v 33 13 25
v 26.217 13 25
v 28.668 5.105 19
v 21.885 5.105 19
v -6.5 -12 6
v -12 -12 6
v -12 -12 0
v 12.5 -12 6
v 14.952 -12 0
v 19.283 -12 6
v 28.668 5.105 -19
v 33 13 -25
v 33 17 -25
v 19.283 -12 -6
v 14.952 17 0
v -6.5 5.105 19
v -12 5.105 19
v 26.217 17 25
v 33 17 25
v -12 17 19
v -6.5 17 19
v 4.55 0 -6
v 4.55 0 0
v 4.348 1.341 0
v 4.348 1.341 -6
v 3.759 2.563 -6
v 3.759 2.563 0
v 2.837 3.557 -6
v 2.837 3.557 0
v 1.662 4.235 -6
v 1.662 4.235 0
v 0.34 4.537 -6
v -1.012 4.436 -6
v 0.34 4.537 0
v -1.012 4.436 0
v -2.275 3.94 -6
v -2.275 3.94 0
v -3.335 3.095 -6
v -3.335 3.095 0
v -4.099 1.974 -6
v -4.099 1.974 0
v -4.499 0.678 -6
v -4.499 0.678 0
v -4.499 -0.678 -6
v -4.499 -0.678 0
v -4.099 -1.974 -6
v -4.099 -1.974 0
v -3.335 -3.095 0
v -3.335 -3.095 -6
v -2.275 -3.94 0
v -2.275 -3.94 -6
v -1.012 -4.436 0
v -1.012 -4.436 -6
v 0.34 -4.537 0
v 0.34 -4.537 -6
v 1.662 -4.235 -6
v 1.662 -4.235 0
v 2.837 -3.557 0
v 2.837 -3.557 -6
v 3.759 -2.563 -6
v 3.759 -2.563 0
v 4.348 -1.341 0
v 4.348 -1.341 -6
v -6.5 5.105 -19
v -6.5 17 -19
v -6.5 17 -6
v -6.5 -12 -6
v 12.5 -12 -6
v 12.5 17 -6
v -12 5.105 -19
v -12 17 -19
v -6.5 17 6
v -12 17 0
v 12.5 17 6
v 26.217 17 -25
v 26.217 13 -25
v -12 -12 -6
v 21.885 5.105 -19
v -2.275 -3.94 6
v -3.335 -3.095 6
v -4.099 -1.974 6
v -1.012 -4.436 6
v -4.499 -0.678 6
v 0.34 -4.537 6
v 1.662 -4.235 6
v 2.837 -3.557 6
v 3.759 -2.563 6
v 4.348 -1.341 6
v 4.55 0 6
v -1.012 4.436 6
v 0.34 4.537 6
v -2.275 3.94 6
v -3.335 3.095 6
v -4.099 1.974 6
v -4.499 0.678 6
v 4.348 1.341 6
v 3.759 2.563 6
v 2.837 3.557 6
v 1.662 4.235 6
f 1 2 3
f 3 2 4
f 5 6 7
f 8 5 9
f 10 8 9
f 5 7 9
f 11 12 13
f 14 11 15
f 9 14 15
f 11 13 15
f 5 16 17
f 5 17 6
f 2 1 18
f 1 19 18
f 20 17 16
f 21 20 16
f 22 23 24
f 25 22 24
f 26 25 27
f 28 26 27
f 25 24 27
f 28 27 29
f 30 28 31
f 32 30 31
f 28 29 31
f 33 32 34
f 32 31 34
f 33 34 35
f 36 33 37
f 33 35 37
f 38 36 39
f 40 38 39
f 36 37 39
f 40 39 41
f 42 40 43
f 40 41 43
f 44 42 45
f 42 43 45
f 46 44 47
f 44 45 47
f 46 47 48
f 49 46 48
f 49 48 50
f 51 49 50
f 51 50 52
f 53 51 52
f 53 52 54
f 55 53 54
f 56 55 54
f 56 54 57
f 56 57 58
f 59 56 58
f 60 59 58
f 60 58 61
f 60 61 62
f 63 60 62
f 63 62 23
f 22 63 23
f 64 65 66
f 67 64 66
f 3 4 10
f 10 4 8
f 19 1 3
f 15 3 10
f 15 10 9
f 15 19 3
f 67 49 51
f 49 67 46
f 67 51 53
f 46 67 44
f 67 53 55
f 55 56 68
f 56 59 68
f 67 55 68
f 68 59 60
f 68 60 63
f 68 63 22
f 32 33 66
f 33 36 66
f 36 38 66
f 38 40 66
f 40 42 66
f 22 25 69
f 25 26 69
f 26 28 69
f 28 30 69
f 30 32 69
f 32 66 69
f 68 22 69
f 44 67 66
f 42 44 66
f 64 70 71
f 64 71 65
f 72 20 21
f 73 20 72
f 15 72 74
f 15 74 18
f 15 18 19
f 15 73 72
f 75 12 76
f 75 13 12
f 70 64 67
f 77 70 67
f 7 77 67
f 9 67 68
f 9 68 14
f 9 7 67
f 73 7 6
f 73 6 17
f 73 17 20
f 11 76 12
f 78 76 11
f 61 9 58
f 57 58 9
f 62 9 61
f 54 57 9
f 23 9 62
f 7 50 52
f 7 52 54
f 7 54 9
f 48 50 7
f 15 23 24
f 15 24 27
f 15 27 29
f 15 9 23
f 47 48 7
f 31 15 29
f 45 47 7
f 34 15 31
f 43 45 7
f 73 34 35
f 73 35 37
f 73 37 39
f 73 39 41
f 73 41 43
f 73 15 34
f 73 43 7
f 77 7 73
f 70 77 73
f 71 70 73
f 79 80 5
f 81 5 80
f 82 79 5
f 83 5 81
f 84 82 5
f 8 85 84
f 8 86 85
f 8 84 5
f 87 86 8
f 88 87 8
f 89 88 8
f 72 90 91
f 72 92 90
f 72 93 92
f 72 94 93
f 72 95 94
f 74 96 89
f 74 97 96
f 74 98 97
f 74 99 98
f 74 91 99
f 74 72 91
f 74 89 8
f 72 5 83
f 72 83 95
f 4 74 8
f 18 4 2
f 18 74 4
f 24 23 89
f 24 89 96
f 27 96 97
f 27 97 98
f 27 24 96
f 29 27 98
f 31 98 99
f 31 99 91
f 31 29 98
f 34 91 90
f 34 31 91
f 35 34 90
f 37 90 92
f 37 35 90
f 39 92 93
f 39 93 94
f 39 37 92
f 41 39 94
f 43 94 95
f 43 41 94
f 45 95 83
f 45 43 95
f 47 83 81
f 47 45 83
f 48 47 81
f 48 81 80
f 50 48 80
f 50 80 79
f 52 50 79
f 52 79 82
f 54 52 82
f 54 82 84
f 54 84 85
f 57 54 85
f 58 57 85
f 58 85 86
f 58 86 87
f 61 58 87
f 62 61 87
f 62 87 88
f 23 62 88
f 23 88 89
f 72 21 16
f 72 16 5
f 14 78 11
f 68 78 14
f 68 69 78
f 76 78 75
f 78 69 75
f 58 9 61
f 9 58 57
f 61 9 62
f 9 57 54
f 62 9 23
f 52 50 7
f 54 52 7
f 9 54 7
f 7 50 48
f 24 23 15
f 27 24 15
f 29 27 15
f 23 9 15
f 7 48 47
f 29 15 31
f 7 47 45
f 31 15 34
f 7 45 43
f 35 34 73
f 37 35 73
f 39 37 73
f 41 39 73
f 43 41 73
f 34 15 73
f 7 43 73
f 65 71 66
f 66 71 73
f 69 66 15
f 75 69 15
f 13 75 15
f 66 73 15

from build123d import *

# Parameters (mm, degrees)
SKETCH1_R                      = 4.55
BOSS_EXTRUDE1_DEPTH            = 25
SKETCH2_W                      = 5.5
SKETCH2_H                      = 6
CUT_EXTRUDE1_DEPTH             = 30
CUT_EXTRUDE3_REACH             = 7.5
CUT_EXTRUDE3_DIRECTION_2_REACH = 41.5


with BuildPart() as part:
    # Sketch1 → Boss-Extrude1 (new body)
    with BuildSketch(Plane.XY):
        Polygon((-12, -12), (-12, 17), (33, 17), (33, 12), (33, -12), (0, -12), align=None)
        Circle(SKETCH1_R, mode=Mode.SUBTRACT)
    extrude(amount=-BOSS_EXTRUDE1_DEPTH)

    # Sketch2 → Cut-Extrude1 (cut, through all)
    with BuildSketch(Plane(origin=(0, 17, 0), x_dir=(1, 0, 0), z_dir=(0, 1, 0))):
        Polygon((33, 0), (33, 25), (14.951933913, 0), align=None)
        Polygon((26.216530226, 25), (-6.5, 25), (-6.5, 19), (-6.5, 6), (12.5, 6), align=None)
        with Locations((-9.25, 22)):
            Rectangle(SKETCH2_W, SKETCH2_H)
    extrude(amount=-CUT_EXTRUDE1_DEPTH, mode=Mode.SUBTRACT)

    # Cut-Extrude3: up to this face of the body (flat: up to its plane)
    cut_extrude3_end = Plane(part.part.faces().sort_by_distance((-12, 2.5, -9.5))[0])
    # Sketch4 → Cut-Extrude3 (cut, up to the picked face)
    with BuildSketch(Plane(origin=(-6.5, 0, 0), x_dir=(0, 0, -1), z_dir=(1, 0, 0)), mode=Mode.PRIVATE) as cut_extrude3_sk1:
        Polygon((25, 13), (19, 5.105263158), (19, -12), (25, -12), align=None)
    cut_extrude3_tool1 = split(extrude(cut_extrude3_sk1.sketch, amount=-CUT_EXTRUDE3_REACH, mode=Mode.PRIVATE), bisect_by=cut_extrude3_end, keep=Keep.BOTH, mode=Mode.PRIVATE)
    add(cut_extrude3_tool1.solids().sort_by_distance((-6.5, -1.350329, -22.1875))[0], mode=Mode.SUBTRACT)
    # Sketch4 → Cut-Extrude3 (cut, up to the picked face)
    with BuildSketch(Plane(origin=(-6.5, 0, 0), x_dir=(0, 0, -1), z_dir=(1, 0, 0)), mode=Mode.PRIVATE) as cut_extrude3_sk2:
        Polygon((19, 5.105263158), (6, -12), (19, -12), align=None)
    cut_extrude3_tool2 = split(extrude(cut_extrude3_sk2.sketch, amount=-CUT_EXTRUDE3_REACH, mode=Mode.PRIVATE), bisect_by=cut_extrude3_end, keep=Keep.BOTH, mode=Mode.PRIVATE)
    add(cut_extrude3_tool2.solids().sort_by_distance((-6.5, -6.298246, -14.666667))[0], mode=Mode.SUBTRACT)

    # Cut-Extrude3 direction 2: up to this face of the body (flat: up to its plane)
    cut_extrude3_direction_2_end = Plane(part.part.faces().sort_by_distance((23.975966956, 2.5, -12.5))[0])
    # Sketch4 → Cut-Extrude3 direction 2 (cut, up to the picked face)
    with BuildSketch(Plane(origin=(-6.5, 0, 0), x_dir=(0, 0, -1), z_dir=(1, 0, 0)), mode=Mode.PRIVATE) as cut_extrude3_direction_2_sk1:
        Polygon((25, 13), (19, 5.105263158), (19, -12), (25, -12), align=None)
    cut_extrude3_direction_2_tool1 = split(extrude(cut_extrude3_direction_2_sk1.sketch, amount=CUT_EXTRUDE3_DIRECTION_2_REACH, mode=Mode.PRIVATE), bisect_by=cut_extrude3_direction_2_end, keep=Keep.BOTH, mode=Mode.PRIVATE)
    add(cut_extrude3_direction_2_tool1.solids().sort_by_distance((-6.5, -1.350329, -22.1875))[0], mode=Mode.SUBTRACT)
    # Sketch4 → Cut-Extrude3 direction 2 (cut, up to the picked face)
    with BuildSketch(Plane(origin=(-6.5, 0, 0), x_dir=(0, 0, -1), z_dir=(1, 0, 0)), mode=Mode.PRIVATE) as cut_extrude3_direction_2_sk2:
        Polygon((19, 5.105263158), (6, -12), (19, -12), align=None)
    cut_extrude3_direction_2_tool2 = split(extrude(cut_extrude3_direction_2_sk2.sketch, amount=CUT_EXTRUDE3_DIRECTION_2_REACH, mode=Mode.PRIVATE), bisect_by=cut_extrude3_direction_2_end, keep=Keep.BOTH, mode=Mode.PRIVATE)
    add(cut_extrude3_direction_2_tool2.solids().sort_by_distance((-6.5, -6.298246, -14.666667))[0], mode=Mode.SUBTRACT)


with BuildPart() as body_2:
    # Mirror3: mirrored copy
    add(part.part.mirror(Plane.XY))


solid = Compound([part.part, body_2.part])
